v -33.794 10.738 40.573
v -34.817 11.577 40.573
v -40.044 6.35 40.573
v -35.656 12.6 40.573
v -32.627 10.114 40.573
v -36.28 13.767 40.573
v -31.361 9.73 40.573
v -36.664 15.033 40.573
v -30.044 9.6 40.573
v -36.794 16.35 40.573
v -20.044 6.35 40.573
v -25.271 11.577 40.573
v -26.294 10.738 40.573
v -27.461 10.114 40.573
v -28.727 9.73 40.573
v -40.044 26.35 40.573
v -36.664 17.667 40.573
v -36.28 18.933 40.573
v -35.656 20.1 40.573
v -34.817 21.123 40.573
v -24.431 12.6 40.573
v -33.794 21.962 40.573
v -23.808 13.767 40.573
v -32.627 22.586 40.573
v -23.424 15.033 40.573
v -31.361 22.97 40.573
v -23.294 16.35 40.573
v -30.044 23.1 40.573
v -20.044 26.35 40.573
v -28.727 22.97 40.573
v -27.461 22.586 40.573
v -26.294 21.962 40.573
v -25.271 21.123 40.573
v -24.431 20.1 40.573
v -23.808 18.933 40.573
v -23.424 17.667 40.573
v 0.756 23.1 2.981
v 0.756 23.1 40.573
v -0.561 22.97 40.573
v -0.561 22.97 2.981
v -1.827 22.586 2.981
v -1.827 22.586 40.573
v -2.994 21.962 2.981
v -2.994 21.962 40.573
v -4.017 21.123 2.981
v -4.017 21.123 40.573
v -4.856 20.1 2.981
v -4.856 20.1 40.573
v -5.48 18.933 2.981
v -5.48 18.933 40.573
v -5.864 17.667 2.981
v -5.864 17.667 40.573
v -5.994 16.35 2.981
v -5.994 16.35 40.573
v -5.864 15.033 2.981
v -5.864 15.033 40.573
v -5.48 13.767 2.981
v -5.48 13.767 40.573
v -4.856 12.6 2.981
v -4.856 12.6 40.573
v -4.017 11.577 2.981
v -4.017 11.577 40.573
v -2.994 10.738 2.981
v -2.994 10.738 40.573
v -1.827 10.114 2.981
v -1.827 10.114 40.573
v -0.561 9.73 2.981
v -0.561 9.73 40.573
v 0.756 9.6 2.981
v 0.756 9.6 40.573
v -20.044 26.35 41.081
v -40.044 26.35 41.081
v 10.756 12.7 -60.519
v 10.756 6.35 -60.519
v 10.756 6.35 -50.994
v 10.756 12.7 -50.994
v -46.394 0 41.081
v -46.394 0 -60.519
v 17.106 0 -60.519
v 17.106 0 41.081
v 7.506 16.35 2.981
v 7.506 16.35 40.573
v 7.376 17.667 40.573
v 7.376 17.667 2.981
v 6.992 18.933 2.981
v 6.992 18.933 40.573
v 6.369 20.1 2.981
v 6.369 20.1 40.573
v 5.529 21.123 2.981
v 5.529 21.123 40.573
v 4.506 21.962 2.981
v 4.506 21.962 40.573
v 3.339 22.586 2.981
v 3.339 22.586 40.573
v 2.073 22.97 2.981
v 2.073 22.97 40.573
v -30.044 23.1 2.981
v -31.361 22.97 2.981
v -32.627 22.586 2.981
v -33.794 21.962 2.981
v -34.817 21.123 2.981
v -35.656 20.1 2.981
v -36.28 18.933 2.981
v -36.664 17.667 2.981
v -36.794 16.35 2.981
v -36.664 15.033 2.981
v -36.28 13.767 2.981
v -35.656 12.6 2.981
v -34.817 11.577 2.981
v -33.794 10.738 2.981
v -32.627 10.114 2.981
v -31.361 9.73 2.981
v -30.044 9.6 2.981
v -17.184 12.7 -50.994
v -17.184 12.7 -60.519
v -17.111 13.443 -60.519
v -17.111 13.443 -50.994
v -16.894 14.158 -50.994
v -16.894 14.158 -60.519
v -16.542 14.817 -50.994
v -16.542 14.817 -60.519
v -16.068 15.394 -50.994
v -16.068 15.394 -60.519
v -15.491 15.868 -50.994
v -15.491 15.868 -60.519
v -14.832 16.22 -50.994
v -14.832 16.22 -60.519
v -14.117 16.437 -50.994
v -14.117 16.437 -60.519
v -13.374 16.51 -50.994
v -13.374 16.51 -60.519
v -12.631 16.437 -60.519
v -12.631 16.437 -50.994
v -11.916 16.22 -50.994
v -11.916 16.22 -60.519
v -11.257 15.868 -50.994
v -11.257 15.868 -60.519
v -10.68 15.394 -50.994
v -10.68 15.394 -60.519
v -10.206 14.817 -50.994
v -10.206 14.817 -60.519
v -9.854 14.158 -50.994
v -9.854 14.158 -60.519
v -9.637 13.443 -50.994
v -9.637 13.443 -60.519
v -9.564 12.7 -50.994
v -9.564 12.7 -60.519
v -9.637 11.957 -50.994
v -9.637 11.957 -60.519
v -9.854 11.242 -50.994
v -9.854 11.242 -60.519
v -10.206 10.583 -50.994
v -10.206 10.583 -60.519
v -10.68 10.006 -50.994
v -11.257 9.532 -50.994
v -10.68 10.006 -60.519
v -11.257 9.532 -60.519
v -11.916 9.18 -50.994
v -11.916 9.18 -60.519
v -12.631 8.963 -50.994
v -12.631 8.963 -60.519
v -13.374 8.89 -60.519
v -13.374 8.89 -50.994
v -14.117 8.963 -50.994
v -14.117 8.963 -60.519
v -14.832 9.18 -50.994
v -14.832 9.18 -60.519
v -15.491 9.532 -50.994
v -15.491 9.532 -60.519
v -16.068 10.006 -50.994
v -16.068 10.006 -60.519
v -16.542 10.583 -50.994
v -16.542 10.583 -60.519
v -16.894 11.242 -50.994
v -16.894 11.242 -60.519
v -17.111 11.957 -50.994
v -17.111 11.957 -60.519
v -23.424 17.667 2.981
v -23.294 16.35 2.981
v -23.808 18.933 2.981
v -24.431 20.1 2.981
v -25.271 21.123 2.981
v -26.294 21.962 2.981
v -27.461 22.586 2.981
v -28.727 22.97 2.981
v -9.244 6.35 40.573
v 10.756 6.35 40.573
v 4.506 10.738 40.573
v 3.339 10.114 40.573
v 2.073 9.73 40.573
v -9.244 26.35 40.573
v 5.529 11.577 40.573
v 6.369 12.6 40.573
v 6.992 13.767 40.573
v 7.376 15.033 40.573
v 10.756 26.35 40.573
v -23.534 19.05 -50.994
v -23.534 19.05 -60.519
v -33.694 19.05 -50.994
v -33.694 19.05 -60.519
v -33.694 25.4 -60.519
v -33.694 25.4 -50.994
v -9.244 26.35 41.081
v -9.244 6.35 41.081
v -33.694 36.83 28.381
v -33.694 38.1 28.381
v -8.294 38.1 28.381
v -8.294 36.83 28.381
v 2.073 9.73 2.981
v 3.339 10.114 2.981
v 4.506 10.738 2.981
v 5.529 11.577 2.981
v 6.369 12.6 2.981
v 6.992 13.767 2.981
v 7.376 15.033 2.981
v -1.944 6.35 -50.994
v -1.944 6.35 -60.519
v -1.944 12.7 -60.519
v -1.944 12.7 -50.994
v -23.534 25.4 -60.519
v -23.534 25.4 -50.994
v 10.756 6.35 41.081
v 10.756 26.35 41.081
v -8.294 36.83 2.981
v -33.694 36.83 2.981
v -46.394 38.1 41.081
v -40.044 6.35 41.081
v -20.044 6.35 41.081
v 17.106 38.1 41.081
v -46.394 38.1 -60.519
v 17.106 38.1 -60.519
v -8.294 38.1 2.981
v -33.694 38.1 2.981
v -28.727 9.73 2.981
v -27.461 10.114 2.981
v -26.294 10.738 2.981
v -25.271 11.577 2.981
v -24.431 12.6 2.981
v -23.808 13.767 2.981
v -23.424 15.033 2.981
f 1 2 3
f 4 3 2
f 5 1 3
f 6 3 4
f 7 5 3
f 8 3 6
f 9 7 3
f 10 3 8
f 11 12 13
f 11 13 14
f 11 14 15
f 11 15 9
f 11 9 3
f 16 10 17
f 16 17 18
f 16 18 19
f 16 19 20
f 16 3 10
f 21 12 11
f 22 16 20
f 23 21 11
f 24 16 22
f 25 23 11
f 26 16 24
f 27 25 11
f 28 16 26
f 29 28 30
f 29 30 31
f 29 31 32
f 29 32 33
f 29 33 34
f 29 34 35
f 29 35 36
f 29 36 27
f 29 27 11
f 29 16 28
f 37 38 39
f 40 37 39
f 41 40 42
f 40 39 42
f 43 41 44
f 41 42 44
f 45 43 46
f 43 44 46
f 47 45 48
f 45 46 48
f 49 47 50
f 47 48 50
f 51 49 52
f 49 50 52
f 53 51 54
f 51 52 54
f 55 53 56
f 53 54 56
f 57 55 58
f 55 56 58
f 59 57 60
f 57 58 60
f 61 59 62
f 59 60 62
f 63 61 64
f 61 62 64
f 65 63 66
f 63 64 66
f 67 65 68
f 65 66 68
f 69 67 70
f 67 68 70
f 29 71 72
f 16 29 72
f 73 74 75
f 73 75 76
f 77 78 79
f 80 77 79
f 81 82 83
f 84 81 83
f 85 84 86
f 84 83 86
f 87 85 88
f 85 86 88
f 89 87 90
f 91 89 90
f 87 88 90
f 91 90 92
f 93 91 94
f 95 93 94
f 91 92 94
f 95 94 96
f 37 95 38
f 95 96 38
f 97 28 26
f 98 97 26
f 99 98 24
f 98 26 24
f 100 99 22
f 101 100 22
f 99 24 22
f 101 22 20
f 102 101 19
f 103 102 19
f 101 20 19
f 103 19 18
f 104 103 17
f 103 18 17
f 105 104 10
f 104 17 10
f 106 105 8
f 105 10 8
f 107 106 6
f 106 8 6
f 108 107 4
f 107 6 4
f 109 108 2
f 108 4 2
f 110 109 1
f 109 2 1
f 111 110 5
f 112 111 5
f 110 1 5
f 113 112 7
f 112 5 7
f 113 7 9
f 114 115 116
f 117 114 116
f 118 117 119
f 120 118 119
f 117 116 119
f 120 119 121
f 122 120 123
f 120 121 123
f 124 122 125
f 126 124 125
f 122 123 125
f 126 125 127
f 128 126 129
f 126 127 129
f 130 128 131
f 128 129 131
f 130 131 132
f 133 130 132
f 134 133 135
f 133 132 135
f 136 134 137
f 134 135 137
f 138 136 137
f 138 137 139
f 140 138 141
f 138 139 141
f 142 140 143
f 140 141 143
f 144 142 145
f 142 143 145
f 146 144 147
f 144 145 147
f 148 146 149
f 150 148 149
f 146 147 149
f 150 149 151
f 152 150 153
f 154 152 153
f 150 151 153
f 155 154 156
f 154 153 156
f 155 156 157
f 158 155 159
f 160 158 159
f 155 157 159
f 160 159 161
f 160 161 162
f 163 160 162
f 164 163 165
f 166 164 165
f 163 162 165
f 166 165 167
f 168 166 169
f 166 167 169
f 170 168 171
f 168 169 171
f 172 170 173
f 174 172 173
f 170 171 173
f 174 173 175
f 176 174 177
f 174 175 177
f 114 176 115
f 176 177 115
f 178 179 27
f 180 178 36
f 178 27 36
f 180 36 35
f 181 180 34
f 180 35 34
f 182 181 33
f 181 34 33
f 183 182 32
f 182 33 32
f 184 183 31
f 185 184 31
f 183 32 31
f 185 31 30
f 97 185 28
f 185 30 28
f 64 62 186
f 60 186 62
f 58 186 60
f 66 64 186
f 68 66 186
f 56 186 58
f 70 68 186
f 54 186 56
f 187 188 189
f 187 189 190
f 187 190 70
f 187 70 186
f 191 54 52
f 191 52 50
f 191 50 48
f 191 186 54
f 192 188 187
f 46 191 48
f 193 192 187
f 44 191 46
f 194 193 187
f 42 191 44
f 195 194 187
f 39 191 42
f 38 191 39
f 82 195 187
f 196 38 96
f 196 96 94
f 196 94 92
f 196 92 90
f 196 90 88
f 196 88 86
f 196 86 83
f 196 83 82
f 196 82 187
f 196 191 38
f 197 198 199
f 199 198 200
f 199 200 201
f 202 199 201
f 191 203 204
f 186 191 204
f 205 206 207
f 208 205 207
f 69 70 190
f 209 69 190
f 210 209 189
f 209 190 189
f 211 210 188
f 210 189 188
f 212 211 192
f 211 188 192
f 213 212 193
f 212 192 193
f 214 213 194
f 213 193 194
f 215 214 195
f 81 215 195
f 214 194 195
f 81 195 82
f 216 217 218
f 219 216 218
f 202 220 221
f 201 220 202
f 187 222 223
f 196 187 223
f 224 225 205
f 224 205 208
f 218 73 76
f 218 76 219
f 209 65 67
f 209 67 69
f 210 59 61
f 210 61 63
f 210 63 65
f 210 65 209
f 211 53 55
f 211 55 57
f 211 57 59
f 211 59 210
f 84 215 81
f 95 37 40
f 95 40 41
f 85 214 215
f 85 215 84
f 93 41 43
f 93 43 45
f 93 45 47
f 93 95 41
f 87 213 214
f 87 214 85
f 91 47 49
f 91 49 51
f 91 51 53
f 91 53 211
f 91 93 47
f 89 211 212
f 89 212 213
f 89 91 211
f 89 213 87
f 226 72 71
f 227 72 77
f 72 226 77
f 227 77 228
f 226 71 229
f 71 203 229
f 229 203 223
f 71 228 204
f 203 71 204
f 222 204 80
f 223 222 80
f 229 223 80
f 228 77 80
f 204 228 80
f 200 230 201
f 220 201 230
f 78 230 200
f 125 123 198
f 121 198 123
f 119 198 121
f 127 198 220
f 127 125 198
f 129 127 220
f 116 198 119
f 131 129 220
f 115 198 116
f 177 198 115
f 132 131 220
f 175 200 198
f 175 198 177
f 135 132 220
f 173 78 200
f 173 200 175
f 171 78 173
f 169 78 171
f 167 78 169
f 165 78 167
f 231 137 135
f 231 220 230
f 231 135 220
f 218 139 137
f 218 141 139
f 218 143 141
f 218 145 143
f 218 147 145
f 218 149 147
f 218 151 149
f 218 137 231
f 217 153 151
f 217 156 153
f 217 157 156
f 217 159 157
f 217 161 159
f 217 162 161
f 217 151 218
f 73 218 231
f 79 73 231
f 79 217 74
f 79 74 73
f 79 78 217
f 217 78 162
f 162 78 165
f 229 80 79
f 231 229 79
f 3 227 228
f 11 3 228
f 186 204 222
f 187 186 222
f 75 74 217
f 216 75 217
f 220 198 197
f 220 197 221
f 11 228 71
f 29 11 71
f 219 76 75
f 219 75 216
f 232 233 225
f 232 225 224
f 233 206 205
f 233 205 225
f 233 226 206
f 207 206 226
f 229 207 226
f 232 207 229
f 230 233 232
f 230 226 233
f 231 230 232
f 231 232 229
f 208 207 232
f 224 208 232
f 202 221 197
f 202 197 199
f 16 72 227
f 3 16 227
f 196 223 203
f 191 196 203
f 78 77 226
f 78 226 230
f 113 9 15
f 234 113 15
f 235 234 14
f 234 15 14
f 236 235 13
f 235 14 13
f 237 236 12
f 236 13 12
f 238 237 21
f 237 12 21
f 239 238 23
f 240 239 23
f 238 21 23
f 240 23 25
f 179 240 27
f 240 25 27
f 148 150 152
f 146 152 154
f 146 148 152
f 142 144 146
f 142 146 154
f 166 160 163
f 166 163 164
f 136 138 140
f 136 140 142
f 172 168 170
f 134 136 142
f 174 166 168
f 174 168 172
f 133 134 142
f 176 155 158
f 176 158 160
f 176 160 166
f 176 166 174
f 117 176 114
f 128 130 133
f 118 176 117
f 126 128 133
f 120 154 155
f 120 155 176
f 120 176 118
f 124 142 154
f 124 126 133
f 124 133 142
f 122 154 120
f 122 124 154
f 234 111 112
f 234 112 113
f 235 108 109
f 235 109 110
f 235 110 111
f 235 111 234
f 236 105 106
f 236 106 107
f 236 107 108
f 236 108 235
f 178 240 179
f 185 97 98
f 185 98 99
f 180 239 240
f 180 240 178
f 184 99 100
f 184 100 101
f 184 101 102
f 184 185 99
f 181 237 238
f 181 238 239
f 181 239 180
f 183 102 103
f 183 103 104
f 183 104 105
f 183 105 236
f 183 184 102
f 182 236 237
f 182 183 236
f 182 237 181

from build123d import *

# Parameters (mm, degrees)
SKETCH1_W           = 63.5
SKETCH1_H           = 101.6
BOSS_EXTRUDE1_DEPTH = 38.1
SKETCH2_R           = 6.75
CUT_EXTRUDE1_DEPTH  = 38.1
SKETCH2_3_W         = 20
SKETCH2_3_H         = 20
SKETCH2_3_R         = 6.75
CUT_EXTRUDE2_DEPTH  = 0.508
SKETCH3_R           = 3.81
SKETCH3_W           = 10.16
SKETCH3_H           = 6.35
SKETCH3_W_2         = 12.7
CUT_EXTRUDE3_DEPTH  = 9.525
SKETCH5_W           = 25.4
SKETCH5_H           = 25.4
CUT_EXTRUDE4_DEPTH  = 1.27


with BuildPart() as part:
    # Sketch1 → Boss-Extrude1 (new body)
    with BuildSketch(Plane(origin=(0, 0, 0), x_dir=(1, 0, 0), z_dir=(0, 1, 0))):
        with Locations((-14.643877551, 9.719387755)):
            Rectangle(SKETCH1_W, SKETCH1_H)
    extrude(amount=BOSS_EXTRUDE1_DEPTH)

    # Sketch2 → Cut-Extrude1 (cut)
    with BuildSketch(Plane.XY.offset(41.080612245)):
        with Locations((-30.043877551, 16.35)):
            Circle(SKETCH2_R)
        with Locations((0.756122449, 16.35)):
            Circle(SKETCH2_R)
    extrude(amount=-CUT_EXTRUDE1_DEPTH, mode=Mode.SUBTRACT)

    # Sketch2<3> → Cut-Extrude2 (cut)
    # profile 1 of 2: a face of its own
    with BuildSketch(Plane.XY.offset(41.080612245)):
        with Locations((-30.043877551, 16.35)):
            Rectangle(SKETCH2_3_W, SKETCH2_3_H)
        with Locations((-30.043877551, 16.35)):
            Circle(SKETCH2_3_R, mode=Mode.SUBTRACT)
    # profile 2 of 2: a face of its own
    with BuildSketch(Plane.XY.offset(41.080612245)):
        with Locations((0.756122449, 16.35)):
            Rectangle(SKETCH2_3_W, SKETCH2_3_H)
        with Locations((0.756122449, 16.35)):
            Circle(SKETCH2_3_R, mode=Mode.SUBTRACT)
    extrude(amount=-CUT_EXTRUDE2_DEPTH, mode=Mode.SUBTRACT)

    # Sketch3 → Cut-Extrude3 (cut)
    with BuildSketch(Plane(origin=(0, 0, -60.519387755), x_dir=(-1, 0, 0), z_dir=(0, 0, -1))):
        with Locations((13.373877551, 12.7)):
            Circle(SKETCH3_R)
        with Locations((28.613877551, 22.225)):
            Rectangle(SKETCH3_W, SKETCH3_H)
        with Locations((-4.406122449, 9.525)):
            Rectangle(SKETCH3_W_2, SKETCH3_H)
    extrude(amount=-CUT_EXTRUDE3_DEPTH, mode=Mode.SUBTRACT)

    # Sketch5 → Cut-Extrude4 (cut)
    with BuildSketch(Plane(origin=(0, 38.1, 0), x_dir=(1, 0, 0), z_dir=(0, 1, 0))):
        with Locations((-20.993877551, -15.680612245)):
            Rectangle(SKETCH5_W, SKETCH5_H)
    extrude(amount=-CUT_EXTRUDE4_DEPTH, mode=Mode.SUBTRACT)


solid = part.part
